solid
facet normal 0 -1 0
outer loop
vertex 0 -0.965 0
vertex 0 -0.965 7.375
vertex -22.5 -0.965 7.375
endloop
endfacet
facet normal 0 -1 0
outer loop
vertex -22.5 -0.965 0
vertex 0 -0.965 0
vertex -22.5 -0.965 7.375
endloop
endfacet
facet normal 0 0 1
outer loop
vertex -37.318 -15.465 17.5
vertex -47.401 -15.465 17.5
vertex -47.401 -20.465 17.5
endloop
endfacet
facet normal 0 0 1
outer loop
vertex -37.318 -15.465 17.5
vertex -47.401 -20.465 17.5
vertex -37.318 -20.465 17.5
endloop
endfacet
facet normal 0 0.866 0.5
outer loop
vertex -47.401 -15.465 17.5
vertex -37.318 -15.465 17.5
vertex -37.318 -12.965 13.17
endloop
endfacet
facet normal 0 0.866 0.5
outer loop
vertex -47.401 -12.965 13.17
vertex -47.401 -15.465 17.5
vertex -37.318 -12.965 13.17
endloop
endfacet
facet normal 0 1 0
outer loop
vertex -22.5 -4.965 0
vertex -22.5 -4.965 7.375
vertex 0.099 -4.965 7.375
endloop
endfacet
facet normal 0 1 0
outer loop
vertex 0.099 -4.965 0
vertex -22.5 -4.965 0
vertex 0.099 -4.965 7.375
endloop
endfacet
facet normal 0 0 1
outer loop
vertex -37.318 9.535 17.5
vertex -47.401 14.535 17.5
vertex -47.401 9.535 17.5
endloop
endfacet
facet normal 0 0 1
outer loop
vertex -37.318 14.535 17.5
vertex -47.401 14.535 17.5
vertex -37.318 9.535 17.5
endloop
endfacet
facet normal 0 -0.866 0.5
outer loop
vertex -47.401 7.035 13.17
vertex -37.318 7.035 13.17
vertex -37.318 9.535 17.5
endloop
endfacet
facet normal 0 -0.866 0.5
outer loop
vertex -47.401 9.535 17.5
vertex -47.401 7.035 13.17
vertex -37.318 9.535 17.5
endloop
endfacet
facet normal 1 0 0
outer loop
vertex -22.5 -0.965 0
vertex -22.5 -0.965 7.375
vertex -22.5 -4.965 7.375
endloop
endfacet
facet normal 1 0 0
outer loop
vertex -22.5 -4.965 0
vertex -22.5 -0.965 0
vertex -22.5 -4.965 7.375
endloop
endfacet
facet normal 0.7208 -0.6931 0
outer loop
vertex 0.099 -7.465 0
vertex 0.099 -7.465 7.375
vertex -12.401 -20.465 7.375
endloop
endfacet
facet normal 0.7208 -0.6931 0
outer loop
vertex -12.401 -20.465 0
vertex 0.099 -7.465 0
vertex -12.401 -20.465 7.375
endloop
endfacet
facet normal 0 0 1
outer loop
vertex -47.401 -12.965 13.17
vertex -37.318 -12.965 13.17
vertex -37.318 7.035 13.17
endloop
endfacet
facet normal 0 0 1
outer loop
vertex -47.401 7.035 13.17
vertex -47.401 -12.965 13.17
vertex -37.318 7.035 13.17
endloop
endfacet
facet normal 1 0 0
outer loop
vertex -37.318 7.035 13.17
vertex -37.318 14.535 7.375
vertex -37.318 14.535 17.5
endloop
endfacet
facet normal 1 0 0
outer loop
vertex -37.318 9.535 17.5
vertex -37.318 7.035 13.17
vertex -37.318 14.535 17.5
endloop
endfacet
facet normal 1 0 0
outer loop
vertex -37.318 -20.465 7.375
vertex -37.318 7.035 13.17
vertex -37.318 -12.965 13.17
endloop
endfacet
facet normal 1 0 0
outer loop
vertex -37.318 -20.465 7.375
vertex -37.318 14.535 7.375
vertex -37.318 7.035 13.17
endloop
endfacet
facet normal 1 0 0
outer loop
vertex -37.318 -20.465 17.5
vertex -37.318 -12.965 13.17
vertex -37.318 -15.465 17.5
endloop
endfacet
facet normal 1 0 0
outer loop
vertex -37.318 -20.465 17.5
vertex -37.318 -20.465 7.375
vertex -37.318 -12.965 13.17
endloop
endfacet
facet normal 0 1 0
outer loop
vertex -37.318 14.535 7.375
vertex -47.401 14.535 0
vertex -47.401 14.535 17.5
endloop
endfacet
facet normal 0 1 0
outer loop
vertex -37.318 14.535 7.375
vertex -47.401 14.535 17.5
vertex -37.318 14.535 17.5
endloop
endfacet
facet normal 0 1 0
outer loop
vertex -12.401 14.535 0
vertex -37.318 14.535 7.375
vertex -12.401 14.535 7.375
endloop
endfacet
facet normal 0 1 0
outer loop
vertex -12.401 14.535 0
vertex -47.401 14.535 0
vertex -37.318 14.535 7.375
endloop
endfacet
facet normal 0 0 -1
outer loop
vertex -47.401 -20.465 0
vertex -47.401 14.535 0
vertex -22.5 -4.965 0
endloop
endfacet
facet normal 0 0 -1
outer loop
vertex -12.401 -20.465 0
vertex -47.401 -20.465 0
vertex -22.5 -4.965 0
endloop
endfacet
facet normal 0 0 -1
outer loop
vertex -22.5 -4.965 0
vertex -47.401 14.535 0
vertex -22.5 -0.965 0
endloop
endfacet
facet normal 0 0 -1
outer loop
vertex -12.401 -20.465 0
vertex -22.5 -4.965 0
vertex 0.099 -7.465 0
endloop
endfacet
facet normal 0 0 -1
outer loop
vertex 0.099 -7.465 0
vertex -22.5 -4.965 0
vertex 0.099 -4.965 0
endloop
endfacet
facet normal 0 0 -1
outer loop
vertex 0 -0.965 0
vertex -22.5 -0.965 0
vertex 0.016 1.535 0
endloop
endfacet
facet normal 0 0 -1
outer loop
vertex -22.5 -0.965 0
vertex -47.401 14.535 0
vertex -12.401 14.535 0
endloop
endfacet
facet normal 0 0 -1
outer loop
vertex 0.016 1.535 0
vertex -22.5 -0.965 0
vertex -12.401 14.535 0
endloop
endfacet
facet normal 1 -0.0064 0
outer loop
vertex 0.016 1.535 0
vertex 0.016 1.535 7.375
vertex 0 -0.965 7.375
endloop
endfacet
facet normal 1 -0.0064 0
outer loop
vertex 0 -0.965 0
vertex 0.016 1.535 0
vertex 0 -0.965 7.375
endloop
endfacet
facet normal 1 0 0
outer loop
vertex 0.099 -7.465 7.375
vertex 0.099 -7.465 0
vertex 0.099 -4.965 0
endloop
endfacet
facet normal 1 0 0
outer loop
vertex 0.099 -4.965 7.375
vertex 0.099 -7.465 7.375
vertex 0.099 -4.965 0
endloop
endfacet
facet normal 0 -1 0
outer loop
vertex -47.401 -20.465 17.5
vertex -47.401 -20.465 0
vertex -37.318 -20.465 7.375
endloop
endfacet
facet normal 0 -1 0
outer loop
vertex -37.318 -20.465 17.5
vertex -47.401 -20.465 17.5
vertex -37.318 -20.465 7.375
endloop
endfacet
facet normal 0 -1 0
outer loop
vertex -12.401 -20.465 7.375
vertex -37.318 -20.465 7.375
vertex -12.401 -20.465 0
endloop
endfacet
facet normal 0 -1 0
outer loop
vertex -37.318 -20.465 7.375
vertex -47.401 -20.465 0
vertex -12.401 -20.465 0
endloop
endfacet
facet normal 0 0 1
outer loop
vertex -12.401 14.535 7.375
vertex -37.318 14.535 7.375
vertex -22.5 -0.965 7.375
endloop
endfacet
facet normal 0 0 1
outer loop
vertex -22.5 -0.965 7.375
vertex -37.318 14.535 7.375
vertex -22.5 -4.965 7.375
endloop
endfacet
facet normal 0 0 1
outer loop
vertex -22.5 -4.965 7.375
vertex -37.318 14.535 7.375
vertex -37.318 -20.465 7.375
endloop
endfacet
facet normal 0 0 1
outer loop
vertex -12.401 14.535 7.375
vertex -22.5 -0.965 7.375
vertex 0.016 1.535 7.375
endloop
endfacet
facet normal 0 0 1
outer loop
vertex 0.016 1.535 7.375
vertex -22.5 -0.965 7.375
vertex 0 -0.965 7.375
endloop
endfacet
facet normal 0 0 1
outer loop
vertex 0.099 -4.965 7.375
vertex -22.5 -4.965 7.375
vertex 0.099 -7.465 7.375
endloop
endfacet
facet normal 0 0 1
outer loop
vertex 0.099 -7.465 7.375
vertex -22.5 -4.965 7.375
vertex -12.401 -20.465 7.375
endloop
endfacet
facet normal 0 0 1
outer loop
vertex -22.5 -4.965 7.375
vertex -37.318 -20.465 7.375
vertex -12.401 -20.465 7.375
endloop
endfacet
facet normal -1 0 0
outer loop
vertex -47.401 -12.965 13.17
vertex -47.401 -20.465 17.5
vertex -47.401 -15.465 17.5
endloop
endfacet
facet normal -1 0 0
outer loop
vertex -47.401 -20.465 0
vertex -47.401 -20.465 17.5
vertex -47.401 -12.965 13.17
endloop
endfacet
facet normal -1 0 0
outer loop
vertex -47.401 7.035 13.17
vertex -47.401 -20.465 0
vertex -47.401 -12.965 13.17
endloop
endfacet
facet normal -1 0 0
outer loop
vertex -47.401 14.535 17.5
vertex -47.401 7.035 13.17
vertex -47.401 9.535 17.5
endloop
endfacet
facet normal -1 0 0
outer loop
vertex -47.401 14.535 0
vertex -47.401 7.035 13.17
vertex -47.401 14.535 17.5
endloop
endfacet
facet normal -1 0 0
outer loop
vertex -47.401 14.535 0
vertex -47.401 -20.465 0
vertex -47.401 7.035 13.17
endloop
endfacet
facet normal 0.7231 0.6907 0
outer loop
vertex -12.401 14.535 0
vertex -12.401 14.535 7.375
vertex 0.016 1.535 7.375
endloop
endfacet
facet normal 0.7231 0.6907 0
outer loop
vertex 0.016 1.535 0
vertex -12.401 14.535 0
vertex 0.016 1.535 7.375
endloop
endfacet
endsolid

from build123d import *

# Parameters (mm, degrees)
F0_W     = 47.5
F0_H     = 35
F1_DEPTH = 17.5
F2_W     = 37.4171783071
F2_H     = 10.1249119453
F3_DEPTH = 35.001
F5_DEPTH = 10.0838216929
F7_DEPTH = 7.3760880547
F9_DEPTH = 7.3760880547


with BuildPart() as f1:
    # F0 (on Top) → F1 (new body)
    with BuildSketch(Plane.XY):
        with Locations((-23.6512488086, -2.9649846256)):
            Rectangle(F0_W, F0_H)
    extrude(amount=F1_DEPTH)

    # F2 (on face) → F3 (cut, through all)
    with BuildSketch(Plane.XZ.offset(20.4649846256)):
        with Locations((-18.6098379621, 12.4375440273)):
            Rectangle(F2_W, F2_H)
    extrude(amount=-F3_DEPTH, mode=Mode.SUBTRACT)

    # F4 (on face) → F5 (cut, through all)
    with BuildSketch(Plane.YZ.offset(-37.3184271157)):
        Polygon((9.5350153744, 17.5), (-15.4649846256, 17.5), (-12.9649846256, 13.1698729811), (7.0350153744, 13.1698729811), align=None)
    extrude(amount=-F5_DEPTH, mode=Mode.SUBTRACT)

    # F6 (on face) → F7 (cut, through all)
    with BuildSketch(Plane.XY.offset(7.3750880547)):
        Polygon((-22.5, -4.9646700483), (0.0987511914, -4.9646700483), (0.0987511914, 14.5350153744), (0, -0.9646700483), (-22.5, -0.9646700483), align=None)
    extrude(amount=-F7_DEPTH, mode=Mode.SUBTRACT)

    # F8 (on face) → F9 (cut, through all)
    with BuildSketch(Plane.XY.offset(7.3750880547)):
        Polygon((0.0987511914, -9.7249615937), (0.0987511914, -7.4646700483), (-12.4012488086, -20.4649846256), (0.0987511914, -20.4649846256), align=None)
        Polygon((-12.4012488086, 14.5350153744), (0.0159276115, 1.5352792135), (0.0987511914, 14.5350153744), align=None)
    extrude(amount=-F9_DEPTH, mode=Mode.SUBTRACT)


solid = f1.part
